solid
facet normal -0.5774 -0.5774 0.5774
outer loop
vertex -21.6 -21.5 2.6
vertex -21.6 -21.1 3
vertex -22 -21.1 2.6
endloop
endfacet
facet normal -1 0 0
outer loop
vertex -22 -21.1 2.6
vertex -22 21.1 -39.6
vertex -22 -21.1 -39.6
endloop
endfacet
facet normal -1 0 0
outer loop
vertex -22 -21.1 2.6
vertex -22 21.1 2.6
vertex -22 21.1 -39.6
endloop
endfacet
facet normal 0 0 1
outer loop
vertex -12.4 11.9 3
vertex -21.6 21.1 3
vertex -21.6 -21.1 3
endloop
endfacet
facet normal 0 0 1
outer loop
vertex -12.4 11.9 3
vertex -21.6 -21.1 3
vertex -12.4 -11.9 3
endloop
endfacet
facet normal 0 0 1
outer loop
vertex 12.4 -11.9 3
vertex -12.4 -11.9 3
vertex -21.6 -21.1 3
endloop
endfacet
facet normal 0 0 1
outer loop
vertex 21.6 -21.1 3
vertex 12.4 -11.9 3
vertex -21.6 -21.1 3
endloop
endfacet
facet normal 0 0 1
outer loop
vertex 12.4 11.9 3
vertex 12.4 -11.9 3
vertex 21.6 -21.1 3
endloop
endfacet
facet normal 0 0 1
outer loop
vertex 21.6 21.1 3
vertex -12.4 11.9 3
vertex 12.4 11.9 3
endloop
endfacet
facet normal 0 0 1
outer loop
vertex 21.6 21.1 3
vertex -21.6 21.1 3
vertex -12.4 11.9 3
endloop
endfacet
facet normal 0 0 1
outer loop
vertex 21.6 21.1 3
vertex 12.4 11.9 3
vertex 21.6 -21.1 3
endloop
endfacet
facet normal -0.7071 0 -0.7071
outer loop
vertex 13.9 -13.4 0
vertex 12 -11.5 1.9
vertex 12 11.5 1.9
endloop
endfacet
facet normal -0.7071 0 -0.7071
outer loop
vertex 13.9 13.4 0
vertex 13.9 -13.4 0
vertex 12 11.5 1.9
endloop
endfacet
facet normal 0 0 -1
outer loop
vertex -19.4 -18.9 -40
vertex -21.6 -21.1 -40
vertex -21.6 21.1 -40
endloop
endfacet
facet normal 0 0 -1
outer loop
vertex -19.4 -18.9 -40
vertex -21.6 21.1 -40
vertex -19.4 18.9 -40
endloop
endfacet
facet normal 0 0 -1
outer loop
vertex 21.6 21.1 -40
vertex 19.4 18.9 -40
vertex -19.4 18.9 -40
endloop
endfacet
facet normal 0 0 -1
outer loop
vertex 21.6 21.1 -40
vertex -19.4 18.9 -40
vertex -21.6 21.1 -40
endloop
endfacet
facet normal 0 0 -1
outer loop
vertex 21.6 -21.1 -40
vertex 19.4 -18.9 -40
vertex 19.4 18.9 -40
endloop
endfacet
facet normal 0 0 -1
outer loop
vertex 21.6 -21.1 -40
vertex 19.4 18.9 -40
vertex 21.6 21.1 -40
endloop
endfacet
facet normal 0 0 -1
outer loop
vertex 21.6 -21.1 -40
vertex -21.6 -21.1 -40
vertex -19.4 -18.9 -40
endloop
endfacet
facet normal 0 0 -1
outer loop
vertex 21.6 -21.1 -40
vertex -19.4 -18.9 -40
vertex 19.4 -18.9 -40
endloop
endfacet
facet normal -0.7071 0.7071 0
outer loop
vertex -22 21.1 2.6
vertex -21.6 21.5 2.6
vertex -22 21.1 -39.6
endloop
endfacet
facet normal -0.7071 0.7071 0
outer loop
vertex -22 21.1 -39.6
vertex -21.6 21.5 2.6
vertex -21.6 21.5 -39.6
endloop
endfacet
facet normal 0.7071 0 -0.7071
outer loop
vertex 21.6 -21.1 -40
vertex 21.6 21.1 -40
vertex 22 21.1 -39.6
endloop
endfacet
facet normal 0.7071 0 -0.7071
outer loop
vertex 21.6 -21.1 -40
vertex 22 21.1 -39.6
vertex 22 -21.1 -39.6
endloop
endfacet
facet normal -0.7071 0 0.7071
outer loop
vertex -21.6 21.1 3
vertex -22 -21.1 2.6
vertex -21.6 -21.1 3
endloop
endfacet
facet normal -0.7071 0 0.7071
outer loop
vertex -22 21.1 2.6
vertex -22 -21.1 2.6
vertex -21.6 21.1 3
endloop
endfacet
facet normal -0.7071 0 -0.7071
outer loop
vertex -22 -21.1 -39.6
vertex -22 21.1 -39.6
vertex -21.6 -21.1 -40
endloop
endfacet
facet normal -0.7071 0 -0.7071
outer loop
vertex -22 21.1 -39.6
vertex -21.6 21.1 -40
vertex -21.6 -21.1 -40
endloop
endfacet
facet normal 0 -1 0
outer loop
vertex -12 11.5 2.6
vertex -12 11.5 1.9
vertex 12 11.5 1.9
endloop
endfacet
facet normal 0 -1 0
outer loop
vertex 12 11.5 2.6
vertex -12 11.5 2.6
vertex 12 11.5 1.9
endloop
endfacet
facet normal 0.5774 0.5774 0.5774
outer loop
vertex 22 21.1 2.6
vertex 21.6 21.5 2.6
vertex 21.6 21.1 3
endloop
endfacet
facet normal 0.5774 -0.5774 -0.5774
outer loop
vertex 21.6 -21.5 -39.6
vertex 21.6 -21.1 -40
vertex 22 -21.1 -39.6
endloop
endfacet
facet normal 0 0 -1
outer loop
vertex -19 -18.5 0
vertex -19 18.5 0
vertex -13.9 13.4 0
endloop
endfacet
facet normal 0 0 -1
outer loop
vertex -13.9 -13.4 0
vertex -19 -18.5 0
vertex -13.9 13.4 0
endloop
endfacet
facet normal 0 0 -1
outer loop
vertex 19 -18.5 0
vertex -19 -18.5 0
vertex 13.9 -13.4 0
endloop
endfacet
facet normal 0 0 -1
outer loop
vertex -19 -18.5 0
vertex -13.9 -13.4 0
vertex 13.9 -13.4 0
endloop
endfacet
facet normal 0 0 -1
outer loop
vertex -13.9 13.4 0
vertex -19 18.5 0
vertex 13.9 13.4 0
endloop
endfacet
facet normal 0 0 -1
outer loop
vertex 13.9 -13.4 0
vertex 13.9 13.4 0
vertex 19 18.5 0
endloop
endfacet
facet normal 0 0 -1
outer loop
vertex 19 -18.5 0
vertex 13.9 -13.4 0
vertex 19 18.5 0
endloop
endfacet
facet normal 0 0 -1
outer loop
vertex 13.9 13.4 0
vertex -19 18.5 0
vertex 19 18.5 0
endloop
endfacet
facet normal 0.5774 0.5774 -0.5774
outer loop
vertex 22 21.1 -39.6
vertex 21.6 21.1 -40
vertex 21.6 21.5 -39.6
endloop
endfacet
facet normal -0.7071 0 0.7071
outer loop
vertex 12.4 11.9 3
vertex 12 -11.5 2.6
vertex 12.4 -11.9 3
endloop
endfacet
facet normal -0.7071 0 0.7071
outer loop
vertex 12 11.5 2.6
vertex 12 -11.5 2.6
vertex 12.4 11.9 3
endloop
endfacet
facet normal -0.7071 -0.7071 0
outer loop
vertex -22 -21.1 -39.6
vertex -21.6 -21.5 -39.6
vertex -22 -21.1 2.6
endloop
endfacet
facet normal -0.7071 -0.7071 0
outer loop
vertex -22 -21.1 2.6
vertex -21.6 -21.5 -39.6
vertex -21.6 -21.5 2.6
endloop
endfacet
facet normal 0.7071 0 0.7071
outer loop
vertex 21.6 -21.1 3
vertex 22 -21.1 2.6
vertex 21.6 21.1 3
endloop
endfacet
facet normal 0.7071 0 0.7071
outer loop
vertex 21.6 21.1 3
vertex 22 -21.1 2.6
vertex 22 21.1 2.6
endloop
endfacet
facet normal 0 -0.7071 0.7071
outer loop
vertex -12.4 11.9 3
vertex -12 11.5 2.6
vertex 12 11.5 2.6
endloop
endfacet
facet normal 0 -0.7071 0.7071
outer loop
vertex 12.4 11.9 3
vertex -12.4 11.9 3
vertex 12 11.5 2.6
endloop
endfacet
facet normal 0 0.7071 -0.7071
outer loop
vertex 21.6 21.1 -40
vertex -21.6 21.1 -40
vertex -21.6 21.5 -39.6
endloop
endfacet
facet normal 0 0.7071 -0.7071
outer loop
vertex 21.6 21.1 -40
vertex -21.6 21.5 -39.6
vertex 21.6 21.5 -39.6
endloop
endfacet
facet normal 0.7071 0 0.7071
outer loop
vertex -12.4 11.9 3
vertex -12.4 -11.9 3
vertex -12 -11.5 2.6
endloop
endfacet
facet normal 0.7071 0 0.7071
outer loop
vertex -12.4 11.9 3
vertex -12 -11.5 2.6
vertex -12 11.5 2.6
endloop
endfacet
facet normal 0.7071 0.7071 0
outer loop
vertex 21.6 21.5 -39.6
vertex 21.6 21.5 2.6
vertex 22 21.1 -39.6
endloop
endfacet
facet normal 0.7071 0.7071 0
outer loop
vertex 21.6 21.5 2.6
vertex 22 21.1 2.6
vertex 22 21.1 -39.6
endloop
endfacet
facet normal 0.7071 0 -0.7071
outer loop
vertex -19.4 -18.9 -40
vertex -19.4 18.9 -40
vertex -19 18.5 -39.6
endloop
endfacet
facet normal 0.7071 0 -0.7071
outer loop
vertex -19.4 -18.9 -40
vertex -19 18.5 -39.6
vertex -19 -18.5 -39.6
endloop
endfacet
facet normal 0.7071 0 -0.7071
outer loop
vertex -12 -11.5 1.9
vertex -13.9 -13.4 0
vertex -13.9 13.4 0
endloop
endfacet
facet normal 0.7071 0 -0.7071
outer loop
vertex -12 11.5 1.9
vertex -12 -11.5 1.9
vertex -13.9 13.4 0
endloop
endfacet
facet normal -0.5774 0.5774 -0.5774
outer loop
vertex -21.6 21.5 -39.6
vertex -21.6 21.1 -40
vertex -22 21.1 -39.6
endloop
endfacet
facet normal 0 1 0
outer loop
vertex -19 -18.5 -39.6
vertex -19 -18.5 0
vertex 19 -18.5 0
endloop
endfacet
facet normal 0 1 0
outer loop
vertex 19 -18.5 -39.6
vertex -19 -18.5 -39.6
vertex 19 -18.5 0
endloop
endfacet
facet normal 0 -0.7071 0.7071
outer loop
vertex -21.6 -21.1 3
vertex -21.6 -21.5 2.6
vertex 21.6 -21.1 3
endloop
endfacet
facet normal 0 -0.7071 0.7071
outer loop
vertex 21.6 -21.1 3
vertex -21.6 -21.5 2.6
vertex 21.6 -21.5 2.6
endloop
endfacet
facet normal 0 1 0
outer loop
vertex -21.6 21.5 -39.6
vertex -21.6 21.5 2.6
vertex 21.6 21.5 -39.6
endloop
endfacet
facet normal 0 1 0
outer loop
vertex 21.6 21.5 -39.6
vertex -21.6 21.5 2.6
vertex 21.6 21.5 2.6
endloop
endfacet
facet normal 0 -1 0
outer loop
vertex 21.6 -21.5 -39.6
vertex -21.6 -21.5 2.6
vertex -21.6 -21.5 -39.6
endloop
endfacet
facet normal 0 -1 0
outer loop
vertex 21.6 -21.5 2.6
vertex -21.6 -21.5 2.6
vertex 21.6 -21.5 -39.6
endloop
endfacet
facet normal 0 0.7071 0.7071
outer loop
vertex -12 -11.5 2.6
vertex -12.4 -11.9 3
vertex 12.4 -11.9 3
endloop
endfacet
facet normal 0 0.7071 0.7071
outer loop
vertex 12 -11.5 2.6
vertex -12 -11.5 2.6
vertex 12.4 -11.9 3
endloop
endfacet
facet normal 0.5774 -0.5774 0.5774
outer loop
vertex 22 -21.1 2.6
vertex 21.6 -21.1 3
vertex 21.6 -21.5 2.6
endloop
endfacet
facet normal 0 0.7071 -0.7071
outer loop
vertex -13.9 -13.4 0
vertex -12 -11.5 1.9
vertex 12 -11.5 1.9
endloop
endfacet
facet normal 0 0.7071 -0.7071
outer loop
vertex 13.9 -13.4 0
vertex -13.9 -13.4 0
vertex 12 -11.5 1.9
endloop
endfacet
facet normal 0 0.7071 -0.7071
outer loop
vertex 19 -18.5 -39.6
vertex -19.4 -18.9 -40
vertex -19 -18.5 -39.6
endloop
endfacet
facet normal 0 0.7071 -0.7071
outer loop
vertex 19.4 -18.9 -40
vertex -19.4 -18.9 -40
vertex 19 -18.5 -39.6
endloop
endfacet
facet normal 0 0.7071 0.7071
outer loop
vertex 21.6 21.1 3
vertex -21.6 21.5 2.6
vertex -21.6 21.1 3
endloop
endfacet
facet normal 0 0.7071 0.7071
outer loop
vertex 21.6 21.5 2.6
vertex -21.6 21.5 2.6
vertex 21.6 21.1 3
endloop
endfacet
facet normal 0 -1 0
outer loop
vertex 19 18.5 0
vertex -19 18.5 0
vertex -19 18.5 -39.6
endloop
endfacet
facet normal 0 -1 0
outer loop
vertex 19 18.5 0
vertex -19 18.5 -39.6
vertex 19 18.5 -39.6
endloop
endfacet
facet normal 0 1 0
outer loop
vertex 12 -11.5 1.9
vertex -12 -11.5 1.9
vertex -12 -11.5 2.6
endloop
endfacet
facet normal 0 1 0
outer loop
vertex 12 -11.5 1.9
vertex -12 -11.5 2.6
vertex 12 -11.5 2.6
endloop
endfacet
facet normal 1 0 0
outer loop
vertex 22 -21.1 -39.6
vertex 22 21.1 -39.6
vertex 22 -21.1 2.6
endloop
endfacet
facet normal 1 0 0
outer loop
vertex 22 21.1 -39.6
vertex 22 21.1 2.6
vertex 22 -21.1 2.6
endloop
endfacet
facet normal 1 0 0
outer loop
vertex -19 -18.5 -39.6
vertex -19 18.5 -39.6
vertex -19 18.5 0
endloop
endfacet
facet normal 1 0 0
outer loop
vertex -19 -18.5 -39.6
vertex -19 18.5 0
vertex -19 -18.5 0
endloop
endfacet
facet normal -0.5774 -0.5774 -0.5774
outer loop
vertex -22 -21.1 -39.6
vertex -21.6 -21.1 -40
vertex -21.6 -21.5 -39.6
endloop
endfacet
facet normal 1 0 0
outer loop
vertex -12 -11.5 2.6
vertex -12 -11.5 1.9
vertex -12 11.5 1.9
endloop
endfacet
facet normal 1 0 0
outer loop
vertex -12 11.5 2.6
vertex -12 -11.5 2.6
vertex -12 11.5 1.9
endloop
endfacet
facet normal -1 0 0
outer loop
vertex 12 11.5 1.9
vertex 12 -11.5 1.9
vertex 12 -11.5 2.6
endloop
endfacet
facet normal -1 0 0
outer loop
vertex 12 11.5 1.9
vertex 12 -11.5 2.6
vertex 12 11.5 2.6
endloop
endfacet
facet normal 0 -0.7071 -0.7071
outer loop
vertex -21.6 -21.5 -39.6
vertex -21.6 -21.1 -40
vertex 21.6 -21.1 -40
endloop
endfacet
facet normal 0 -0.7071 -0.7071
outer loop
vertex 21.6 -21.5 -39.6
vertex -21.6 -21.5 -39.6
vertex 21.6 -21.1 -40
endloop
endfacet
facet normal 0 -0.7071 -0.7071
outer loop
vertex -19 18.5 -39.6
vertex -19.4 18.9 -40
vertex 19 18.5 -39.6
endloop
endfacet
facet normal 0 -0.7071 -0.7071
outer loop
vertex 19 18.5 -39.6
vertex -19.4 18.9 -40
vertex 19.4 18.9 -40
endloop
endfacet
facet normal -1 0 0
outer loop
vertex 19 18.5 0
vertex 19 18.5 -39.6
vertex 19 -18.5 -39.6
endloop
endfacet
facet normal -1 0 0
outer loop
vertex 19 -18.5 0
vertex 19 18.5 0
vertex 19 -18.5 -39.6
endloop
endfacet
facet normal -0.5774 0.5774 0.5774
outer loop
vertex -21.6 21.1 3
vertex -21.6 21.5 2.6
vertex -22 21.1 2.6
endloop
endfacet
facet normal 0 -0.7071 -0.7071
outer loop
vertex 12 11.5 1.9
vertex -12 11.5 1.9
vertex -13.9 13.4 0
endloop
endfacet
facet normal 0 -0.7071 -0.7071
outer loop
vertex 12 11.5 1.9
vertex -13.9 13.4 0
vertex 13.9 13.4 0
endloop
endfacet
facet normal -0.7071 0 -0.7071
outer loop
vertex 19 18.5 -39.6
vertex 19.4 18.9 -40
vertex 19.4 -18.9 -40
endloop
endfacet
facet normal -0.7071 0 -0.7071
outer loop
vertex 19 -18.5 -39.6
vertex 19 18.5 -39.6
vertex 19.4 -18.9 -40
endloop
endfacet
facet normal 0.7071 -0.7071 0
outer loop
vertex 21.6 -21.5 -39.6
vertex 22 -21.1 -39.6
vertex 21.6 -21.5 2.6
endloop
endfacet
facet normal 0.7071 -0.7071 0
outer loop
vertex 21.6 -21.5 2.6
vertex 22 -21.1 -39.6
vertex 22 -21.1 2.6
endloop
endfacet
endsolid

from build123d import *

# Parameters (mm, degrees)
SKETCH006_W     = 44
SKETCH006_H     = 43
SKETCH006_W_2   = 24
SKETCH006_H_2   = 23
PAD007_DEPTH    = 3
SKETCH007_W     = 44
SKETCH007_H     = 43
SKETCH007_W_2   = 38
SKETCH007_H_2   = 37
PAD008_DEPTH    = 40
CHAMFER007_SIZE = 1.9
CHAMFER008_SIZE = 0.4


with BuildPart() as part:
    # Sketch006 → Pad007 (new body)
    with BuildSketch(Plane.XY):
        Rectangle(SKETCH006_W, SKETCH006_H)
        Rectangle(SKETCH006_W_2, SKETCH006_H_2, mode=Mode.SUBTRACT)
    extrude(amount=PAD007_DEPTH)

    # Sketch007 (on Face9 of Pad007) → Pad008 (join)
    with BuildSketch(Plane(origin=(0, 0, 0), x_dir=(1, 0, 0), z_dir=(0, 0, -1))):
        Rectangle(SKETCH007_W, SKETCH007_H)
        Rectangle(SKETCH007_W_2, SKETCH007_H_2, mode=Mode.SUBTRACT)
    extrude(amount=PAD008_DEPTH)

    # Chamfer007
    chamfer007_edges = [part.edges().sort_by_distance(p)[0] for p in [
        (0, -11.5, 0),
        (12, 0, 0),
        (0, 11.5, 0),
        (-12, 0, 0),
    ]]
    chamfer(chamfer007_edges, length=CHAMFER007_SIZE)

    # Chamfer008
    chamfer008_edges = [part.edges().sort_by_distance(p)[0] for p in [
        (-22, 0, -40),
        (0, 21.5, -40),
        (22, 0, -40),
        (0, -21.5, -40),
        (-19, 0, -40),
        (0, 18.5, -40),
        (19, 0, -40),
        (0, -18.5, -40),
        (22, 21.5, -18.5),
        (-22, 21.5, -18.5),
        (0, 21.5, 3),
        (-22, 0, 3),
        (0, -21.5, 3),
        (22, 0, 3),
        (-12, 0, 3),
        (0, -11.5, 3),
        (12, 0, 3),
        (0, 11.5, 3),
        (-22, -21.5, -18.5),
        (22, -21.5, -18.5),
    ]]
    chamfer(chamfer008_edges, length=CHAMFER008_SIZE)


solid = part.part
